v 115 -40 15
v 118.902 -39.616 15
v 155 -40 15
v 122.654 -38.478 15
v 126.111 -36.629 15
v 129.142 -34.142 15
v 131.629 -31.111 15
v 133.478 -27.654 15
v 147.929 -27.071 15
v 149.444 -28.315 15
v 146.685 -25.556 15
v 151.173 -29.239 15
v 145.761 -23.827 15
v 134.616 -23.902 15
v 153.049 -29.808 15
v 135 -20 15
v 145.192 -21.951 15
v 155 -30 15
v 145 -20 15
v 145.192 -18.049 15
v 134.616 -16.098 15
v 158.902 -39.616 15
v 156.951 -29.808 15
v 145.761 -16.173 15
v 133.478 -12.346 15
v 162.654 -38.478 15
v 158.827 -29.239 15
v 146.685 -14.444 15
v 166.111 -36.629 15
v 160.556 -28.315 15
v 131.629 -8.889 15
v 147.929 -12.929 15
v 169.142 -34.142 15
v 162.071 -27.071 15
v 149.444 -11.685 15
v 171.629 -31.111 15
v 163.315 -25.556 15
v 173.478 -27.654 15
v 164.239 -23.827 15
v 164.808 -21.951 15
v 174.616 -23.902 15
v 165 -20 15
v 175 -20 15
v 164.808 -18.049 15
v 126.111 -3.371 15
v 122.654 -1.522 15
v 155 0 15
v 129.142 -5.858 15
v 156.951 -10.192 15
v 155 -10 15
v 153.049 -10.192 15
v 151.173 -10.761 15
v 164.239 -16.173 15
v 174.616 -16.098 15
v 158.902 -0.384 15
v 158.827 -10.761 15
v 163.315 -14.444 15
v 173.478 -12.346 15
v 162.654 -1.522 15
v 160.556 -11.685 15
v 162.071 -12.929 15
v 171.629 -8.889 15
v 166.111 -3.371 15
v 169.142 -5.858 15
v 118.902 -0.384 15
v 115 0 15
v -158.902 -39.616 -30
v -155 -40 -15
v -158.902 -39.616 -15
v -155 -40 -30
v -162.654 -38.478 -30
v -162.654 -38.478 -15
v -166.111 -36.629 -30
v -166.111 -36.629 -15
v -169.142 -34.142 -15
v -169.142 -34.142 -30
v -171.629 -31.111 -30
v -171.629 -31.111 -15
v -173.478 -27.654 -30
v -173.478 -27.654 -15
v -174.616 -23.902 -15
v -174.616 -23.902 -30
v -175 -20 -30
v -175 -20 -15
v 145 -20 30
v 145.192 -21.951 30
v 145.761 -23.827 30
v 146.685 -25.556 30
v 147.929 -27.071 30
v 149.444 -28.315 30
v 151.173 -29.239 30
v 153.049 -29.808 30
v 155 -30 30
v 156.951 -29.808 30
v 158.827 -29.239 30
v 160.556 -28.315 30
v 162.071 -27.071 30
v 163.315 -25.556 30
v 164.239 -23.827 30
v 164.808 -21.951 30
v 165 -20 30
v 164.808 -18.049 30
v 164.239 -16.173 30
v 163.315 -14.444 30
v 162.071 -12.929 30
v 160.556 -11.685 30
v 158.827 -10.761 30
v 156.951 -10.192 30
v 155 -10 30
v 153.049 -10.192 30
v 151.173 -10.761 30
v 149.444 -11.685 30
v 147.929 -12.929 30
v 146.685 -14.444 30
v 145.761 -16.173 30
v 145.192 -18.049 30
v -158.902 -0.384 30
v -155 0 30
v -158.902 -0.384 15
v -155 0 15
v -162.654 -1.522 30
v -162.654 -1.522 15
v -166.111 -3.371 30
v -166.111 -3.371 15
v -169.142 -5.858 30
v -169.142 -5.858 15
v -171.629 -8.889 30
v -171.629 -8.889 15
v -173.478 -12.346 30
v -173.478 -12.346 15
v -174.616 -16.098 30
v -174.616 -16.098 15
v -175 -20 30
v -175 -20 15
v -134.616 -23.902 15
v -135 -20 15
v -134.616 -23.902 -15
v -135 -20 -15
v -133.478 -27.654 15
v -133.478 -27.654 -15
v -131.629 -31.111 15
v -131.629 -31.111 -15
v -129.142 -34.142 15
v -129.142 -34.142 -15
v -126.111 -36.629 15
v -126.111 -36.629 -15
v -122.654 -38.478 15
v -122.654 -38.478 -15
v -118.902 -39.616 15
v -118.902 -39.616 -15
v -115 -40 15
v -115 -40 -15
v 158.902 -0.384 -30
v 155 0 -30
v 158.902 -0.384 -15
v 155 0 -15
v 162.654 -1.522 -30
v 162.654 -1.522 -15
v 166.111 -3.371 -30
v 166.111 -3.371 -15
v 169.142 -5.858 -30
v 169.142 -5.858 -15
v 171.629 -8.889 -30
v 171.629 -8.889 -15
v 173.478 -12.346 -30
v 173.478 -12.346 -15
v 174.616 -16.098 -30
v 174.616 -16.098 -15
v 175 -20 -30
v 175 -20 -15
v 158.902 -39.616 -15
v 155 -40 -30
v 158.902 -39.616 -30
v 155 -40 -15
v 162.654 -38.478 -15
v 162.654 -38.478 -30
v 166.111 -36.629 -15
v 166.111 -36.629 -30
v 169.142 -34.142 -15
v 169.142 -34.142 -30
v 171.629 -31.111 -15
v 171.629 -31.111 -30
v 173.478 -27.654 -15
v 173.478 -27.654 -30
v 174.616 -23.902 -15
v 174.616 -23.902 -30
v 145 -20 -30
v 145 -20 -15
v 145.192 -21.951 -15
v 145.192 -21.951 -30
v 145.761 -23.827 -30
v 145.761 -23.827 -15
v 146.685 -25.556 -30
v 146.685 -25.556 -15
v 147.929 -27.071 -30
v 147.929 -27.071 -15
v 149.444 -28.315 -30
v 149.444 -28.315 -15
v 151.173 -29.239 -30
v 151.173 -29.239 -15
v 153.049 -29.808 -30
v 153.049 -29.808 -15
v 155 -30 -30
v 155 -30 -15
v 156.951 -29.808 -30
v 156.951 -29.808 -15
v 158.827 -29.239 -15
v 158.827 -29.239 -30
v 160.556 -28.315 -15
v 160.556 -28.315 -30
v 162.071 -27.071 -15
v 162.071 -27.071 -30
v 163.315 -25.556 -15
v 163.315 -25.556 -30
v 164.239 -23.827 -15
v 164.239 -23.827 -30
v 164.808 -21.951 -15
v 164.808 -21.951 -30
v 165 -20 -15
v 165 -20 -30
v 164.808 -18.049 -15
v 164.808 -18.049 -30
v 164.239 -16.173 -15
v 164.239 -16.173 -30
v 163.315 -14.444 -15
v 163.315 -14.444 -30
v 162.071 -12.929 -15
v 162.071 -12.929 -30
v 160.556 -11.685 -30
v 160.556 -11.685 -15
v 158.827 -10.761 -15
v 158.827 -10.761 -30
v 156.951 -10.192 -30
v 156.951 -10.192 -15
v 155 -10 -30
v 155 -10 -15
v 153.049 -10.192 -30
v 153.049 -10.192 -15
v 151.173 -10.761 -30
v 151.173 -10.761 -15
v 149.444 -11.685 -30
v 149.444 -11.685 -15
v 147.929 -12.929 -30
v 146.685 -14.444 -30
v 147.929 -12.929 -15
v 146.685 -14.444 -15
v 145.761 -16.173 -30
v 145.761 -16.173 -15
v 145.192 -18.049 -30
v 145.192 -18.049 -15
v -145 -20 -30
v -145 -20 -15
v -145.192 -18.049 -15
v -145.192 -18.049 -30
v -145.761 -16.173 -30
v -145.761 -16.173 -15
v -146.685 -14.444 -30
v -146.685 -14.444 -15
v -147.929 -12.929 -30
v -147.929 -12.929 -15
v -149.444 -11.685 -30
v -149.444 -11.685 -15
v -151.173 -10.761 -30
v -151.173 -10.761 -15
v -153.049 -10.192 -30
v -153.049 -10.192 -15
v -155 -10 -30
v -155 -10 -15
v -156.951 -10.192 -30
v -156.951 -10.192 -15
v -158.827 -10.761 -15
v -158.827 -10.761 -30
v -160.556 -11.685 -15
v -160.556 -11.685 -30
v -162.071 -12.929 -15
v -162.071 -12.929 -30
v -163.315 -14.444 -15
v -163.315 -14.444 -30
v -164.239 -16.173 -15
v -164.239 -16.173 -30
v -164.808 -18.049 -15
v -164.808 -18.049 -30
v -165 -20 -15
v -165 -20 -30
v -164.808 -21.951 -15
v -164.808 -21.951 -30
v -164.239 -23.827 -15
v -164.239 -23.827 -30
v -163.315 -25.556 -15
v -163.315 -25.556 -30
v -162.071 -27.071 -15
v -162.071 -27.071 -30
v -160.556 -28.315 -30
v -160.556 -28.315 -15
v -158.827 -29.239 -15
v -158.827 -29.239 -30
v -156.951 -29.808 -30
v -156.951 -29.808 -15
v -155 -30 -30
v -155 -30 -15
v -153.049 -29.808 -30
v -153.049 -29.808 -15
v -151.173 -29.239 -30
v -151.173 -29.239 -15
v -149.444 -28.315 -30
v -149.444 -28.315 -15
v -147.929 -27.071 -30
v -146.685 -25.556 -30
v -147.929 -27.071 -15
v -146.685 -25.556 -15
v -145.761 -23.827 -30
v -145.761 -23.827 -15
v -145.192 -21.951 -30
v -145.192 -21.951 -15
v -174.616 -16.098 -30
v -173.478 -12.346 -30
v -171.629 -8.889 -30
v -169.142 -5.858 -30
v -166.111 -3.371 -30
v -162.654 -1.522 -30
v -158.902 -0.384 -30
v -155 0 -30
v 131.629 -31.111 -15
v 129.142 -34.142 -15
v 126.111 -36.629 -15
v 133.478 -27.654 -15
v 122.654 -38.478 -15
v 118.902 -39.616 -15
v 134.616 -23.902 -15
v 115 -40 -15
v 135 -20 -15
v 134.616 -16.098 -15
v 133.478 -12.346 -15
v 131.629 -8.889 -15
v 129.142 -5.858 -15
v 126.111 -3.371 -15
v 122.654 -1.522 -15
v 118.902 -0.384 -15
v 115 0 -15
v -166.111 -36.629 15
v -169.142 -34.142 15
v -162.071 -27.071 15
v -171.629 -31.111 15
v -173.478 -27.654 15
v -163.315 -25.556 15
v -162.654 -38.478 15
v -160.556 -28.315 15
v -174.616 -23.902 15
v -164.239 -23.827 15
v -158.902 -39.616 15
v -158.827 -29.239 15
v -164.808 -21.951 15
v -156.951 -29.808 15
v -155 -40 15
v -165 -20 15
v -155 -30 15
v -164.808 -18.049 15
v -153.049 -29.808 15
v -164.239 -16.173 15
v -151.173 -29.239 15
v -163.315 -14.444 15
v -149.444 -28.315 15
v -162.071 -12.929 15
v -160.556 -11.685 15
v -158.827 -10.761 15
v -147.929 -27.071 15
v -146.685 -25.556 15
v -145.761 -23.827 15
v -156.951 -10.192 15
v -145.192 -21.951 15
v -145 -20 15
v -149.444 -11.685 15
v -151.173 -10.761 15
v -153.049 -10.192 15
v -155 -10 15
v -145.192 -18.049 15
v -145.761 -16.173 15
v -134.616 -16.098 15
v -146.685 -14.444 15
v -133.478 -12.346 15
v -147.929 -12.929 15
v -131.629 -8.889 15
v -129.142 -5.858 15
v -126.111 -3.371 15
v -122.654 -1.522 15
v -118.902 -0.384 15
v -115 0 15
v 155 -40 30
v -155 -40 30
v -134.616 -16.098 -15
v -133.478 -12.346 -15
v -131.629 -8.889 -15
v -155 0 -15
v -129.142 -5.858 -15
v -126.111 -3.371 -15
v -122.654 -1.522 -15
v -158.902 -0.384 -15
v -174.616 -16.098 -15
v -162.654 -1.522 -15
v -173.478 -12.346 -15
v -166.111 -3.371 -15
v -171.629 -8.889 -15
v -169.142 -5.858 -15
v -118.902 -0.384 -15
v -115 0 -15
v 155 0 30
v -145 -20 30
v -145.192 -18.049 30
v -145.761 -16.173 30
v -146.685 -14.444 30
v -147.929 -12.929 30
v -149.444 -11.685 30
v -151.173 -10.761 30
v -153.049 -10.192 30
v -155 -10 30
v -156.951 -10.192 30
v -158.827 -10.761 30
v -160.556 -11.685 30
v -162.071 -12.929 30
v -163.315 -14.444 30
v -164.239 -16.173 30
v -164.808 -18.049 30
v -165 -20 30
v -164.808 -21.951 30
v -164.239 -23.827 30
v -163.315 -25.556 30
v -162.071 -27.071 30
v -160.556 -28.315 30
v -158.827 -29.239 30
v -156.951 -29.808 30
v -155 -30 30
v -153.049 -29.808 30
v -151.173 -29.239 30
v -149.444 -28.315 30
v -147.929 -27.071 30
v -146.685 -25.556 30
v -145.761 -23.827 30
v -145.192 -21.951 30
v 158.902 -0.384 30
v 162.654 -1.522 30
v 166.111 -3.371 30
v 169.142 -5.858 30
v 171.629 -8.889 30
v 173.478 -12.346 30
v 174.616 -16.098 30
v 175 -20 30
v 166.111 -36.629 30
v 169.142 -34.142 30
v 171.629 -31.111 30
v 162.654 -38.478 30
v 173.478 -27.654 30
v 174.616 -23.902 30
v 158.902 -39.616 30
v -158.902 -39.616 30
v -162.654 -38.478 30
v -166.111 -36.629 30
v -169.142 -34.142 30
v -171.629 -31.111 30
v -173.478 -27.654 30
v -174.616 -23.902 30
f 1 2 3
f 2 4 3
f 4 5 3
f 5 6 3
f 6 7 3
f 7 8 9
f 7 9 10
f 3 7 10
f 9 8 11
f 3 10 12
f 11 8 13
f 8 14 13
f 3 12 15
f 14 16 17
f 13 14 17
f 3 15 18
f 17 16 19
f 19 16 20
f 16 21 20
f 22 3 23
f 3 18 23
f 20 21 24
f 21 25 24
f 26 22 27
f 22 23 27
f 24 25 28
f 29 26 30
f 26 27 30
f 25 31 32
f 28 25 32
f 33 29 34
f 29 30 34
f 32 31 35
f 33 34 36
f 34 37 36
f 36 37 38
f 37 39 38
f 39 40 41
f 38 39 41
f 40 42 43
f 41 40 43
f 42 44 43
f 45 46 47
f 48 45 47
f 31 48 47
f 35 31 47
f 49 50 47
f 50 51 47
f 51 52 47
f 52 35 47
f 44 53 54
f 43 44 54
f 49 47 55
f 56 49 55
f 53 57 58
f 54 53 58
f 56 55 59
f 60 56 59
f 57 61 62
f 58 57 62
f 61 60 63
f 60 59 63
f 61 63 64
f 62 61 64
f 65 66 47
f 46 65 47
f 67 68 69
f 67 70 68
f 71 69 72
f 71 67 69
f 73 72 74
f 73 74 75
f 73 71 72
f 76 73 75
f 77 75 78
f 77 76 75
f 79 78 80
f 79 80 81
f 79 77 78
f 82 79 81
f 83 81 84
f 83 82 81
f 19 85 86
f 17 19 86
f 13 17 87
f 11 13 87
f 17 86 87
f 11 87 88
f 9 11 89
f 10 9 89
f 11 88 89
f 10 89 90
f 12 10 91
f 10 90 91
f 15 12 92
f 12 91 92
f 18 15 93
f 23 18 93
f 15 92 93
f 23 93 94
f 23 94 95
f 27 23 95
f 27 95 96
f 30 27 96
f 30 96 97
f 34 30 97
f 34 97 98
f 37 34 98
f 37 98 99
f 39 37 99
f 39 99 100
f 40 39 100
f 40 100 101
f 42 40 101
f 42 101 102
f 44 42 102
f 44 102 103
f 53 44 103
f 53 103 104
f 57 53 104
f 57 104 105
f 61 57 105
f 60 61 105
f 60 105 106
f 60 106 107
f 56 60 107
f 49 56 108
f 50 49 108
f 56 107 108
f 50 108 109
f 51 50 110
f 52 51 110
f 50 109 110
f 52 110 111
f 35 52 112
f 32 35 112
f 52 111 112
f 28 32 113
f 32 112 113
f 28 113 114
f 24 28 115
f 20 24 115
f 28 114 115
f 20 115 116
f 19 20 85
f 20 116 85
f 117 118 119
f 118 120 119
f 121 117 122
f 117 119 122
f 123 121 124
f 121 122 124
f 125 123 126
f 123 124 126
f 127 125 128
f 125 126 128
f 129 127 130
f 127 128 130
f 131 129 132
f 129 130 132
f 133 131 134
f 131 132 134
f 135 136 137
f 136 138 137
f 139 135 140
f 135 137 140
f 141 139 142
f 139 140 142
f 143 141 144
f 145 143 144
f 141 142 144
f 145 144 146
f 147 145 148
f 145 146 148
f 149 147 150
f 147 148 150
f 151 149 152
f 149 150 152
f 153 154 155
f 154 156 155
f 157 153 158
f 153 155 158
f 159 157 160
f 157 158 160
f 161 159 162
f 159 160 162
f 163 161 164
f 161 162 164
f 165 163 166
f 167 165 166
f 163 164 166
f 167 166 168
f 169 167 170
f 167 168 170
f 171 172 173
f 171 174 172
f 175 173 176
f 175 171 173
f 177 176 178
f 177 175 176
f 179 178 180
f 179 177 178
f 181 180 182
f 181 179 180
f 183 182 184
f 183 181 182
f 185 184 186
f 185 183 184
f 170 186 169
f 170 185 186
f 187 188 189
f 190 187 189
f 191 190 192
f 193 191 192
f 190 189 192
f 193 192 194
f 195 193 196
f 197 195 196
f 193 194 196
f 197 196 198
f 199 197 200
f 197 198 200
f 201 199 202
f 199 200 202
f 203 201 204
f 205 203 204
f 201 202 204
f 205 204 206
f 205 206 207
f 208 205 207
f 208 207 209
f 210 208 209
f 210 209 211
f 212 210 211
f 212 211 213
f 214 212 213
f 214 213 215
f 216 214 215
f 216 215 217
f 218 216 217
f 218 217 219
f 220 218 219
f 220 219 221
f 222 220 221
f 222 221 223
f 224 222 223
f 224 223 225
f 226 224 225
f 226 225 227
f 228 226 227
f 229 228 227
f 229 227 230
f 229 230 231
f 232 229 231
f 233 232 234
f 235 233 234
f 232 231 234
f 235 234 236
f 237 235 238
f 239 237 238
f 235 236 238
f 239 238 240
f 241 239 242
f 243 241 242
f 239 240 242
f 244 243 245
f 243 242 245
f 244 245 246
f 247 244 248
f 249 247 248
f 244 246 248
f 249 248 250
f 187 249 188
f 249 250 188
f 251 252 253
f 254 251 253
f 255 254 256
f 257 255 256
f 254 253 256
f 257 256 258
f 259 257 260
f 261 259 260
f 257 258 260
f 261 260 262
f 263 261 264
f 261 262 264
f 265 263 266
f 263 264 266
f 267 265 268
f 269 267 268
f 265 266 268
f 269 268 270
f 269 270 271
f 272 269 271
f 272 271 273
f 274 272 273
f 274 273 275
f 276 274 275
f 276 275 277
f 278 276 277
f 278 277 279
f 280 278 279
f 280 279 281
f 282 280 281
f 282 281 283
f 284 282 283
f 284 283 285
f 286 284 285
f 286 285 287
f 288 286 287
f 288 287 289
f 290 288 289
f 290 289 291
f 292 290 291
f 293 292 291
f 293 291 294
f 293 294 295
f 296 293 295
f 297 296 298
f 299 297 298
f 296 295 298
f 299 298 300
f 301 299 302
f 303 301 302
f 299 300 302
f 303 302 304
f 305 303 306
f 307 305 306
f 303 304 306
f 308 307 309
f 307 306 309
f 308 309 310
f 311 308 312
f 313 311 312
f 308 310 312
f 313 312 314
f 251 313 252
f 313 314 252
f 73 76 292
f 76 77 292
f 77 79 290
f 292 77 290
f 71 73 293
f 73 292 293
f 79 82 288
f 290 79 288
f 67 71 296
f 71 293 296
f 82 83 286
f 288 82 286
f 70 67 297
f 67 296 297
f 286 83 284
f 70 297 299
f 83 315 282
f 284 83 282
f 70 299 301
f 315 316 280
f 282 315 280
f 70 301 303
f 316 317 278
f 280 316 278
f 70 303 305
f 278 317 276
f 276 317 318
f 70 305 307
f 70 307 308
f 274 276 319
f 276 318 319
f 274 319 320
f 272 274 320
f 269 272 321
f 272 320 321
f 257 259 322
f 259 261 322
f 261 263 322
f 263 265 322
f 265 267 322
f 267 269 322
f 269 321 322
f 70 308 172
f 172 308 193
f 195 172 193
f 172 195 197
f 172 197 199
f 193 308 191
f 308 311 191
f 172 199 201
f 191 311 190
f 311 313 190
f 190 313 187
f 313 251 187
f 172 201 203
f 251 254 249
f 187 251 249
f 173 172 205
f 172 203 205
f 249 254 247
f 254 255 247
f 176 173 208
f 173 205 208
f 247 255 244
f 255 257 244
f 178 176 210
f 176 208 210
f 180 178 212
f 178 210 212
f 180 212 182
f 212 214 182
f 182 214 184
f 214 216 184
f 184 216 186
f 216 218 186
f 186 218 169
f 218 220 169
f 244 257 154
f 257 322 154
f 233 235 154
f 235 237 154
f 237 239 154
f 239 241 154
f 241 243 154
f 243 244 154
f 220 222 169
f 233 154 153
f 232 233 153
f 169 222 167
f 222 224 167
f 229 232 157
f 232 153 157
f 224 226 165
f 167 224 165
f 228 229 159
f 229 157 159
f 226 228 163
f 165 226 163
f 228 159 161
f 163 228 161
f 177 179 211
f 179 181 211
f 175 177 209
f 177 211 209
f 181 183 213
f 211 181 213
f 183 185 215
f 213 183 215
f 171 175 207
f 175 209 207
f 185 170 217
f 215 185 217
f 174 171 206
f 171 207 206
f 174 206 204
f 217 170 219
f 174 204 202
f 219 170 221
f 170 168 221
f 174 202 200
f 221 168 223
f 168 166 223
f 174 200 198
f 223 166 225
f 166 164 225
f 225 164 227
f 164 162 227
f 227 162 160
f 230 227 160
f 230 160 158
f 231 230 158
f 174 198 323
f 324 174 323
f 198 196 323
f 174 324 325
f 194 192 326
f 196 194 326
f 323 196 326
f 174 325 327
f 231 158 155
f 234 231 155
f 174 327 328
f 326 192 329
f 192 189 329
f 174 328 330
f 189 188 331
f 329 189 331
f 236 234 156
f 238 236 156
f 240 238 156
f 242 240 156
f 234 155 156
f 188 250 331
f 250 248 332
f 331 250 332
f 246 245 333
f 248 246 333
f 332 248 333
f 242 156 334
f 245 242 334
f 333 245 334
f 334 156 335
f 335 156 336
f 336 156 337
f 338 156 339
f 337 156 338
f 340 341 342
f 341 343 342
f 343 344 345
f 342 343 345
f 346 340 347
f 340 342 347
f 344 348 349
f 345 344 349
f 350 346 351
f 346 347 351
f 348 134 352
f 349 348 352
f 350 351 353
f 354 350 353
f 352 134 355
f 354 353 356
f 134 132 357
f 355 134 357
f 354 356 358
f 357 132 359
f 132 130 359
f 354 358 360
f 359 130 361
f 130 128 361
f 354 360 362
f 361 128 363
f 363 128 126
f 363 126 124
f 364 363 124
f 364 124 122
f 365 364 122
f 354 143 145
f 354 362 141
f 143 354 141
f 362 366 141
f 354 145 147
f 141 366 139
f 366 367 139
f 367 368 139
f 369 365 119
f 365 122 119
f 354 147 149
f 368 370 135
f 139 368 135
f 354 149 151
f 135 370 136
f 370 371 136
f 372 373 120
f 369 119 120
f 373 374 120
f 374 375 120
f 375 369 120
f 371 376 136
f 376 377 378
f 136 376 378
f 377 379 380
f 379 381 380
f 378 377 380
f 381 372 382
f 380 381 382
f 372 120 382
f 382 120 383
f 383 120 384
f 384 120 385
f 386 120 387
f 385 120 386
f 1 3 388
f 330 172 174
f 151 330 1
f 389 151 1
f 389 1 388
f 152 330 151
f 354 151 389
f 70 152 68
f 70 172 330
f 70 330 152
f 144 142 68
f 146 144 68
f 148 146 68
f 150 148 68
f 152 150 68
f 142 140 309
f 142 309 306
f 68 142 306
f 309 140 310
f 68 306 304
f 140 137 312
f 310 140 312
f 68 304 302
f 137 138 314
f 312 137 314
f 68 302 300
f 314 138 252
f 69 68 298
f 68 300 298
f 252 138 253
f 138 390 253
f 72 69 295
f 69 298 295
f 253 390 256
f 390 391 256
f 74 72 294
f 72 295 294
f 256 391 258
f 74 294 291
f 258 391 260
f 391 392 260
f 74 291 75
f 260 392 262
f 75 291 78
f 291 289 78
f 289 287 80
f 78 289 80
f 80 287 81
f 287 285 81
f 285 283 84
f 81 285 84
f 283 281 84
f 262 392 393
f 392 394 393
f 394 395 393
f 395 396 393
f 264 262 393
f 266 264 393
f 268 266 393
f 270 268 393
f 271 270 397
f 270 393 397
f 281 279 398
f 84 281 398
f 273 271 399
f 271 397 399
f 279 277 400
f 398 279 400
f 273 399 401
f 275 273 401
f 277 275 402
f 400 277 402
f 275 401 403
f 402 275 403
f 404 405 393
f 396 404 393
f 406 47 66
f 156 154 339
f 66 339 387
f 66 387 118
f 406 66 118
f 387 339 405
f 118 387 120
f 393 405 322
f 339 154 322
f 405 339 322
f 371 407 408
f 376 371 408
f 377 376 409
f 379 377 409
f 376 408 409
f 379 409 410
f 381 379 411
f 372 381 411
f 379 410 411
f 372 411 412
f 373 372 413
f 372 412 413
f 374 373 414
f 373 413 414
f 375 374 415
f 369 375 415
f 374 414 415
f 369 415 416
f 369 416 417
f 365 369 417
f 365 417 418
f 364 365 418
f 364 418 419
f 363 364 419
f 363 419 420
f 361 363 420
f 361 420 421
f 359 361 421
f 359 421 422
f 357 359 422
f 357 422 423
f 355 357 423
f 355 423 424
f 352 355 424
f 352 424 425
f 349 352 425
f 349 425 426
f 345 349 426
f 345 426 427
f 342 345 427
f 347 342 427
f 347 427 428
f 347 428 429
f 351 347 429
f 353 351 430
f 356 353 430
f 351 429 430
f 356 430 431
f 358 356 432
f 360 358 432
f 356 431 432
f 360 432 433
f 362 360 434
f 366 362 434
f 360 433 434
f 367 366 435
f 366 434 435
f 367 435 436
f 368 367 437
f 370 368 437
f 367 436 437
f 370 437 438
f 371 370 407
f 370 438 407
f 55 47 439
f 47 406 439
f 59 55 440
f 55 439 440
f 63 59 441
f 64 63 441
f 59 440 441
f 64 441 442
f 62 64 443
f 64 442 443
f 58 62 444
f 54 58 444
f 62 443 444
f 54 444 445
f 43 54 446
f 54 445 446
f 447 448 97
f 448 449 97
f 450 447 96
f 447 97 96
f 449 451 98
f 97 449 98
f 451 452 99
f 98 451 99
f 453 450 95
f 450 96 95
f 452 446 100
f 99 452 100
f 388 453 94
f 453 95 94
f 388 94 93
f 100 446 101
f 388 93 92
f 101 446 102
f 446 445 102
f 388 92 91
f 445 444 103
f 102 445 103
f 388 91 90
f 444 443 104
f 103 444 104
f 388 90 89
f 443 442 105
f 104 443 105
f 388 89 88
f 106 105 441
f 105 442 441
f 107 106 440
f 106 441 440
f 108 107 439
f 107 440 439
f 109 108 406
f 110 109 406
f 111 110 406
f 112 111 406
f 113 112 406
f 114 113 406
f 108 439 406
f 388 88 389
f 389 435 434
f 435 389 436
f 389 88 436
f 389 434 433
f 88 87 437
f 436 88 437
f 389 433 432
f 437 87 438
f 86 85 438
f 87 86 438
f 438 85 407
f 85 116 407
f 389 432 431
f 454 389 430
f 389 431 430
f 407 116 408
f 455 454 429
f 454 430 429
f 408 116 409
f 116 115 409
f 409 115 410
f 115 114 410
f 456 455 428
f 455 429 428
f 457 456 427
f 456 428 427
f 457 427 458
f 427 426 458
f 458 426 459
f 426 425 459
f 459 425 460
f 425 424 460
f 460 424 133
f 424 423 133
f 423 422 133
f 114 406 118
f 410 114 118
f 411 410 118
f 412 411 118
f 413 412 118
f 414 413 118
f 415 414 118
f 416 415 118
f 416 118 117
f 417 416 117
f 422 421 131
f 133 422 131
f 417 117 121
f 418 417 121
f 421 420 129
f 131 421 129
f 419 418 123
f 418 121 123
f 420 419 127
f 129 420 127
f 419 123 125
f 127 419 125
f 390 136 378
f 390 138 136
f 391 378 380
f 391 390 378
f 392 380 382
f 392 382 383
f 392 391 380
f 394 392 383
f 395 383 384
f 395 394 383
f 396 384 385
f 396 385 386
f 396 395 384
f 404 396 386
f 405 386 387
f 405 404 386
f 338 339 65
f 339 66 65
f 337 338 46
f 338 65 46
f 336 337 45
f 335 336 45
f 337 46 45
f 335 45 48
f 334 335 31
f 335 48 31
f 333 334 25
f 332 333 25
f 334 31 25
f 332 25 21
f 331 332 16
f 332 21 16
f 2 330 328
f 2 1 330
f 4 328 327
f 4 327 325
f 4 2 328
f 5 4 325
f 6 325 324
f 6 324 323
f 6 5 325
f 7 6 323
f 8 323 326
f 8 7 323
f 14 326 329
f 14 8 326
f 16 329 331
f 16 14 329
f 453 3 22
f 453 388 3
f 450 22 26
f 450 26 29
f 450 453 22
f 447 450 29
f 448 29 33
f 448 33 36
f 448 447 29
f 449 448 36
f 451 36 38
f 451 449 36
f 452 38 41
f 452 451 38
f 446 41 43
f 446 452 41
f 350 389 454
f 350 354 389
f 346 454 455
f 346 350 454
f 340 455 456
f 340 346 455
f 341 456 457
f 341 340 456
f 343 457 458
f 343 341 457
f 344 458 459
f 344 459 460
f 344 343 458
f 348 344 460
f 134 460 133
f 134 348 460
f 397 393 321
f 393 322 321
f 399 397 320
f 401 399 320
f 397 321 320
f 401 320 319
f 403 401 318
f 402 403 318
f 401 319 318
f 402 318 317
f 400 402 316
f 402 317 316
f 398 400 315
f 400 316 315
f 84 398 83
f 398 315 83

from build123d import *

# Parameters (mm, degrees)
Y_KSEKLIK_EKSTR_ZYON1_DEPTH = 40
KES_EKSTR_ZYON1_REACH       = 191.275
IZIM2_R                     = 10
RADYUS1_R                   = 20


with BuildPart() as part:
    # Çizim1 → Yükseklik-Ekstrüzyon1 (new body)
    with BuildSketch(Plane(origin=(0, 0, 0), x_dir=(1, 0, 0), z_dir=(0, 1, 0))):
        Polygon((-135, -15), (-135, 15), (-175, 15), (-175, 30), (175, 30), (175, 15), (135, 15), (135, -15), (175, -15), (175, -30), (-175, -30), (-175, -15), align=None)
    extrude(amount=-Y_KSEKLIK_EKSTR_ZYON1_DEPTH)

    # Kes-Ekstrüzyon1: up to this face of the body (flat: up to its plane)
    kes_ekstr_zyon1_end = Plane(part.part.faces().sort_by_distance((0, -20, -30))[0])
    # Çizim2 → Kes-Ekstrüzyon1 (cut, up to the picked face)
    with BuildSketch(Plane.XY.offset(30), mode=Mode.PRIVATE) as kes_ekstr_zyon1_sk1:
        with Locations((-155, -20)):
            Circle(IZIM2_R)
    kes_ekstr_zyon1_tool1 = split(extrude(kes_ekstr_zyon1_sk1.sketch, amount=-KES_EKSTR_ZYON1_REACH, mode=Mode.PRIVATE), bisect_by=kes_ekstr_zyon1_end, keep=Keep.BOTH, mode=Mode.PRIVATE)
    # Çizim2 → Kes-Ekstrüzyon1 (cut, up to the picked face)
    with BuildSketch(Plane.XY.offset(30), mode=Mode.PRIVATE) as kes_ekstr_zyon1_sk2:
        with Locations(Location((155, -20, 0), (0, 0, 180))):
            Circle(IZIM2_R)
    kes_ekstr_zyon1_tool2 = split(extrude(kes_ekstr_zyon1_sk2.sketch, amount=-KES_EKSTR_ZYON1_REACH, mode=Mode.PRIVATE), bisect_by=kes_ekstr_zyon1_end, keep=Keep.BOTH, mode=Mode.PRIVATE)
    add(kes_ekstr_zyon1_tool1.solids().sort_by(Axis((-155, -20, 30), (0, 0, -1)))[0], mode=Mode.SUBTRACT)
    add(kes_ekstr_zyon1_tool2.solids().sort_by(Axis((155, -20, 30), (0, 0, -1)))[0], mode=Mode.SUBTRACT)

    # Radyus1
    radyus1_edges = [part.edges().sort_by_distance(p)[0] for p in [
        (135, -40, 0),
        (135, 0, 0),
        (-135, -40, 0),
        (-135, 0, 0),
        (-175, -40, -22.5),
        (-175, 0, -22.5),
        (-175, 0, 22.5),
        (-175, -40, 22.5),
        (175, 0, -22.5),
        (175, -40, -22.5),
        (175, -40, 22.5),
        (175, 0, 22.5),
    ]]
    fillet(radyus1_edges, radius=RADYUS1_R - 0.0001)  # a hair under: the kernel refuses the full size


solid = part.part
